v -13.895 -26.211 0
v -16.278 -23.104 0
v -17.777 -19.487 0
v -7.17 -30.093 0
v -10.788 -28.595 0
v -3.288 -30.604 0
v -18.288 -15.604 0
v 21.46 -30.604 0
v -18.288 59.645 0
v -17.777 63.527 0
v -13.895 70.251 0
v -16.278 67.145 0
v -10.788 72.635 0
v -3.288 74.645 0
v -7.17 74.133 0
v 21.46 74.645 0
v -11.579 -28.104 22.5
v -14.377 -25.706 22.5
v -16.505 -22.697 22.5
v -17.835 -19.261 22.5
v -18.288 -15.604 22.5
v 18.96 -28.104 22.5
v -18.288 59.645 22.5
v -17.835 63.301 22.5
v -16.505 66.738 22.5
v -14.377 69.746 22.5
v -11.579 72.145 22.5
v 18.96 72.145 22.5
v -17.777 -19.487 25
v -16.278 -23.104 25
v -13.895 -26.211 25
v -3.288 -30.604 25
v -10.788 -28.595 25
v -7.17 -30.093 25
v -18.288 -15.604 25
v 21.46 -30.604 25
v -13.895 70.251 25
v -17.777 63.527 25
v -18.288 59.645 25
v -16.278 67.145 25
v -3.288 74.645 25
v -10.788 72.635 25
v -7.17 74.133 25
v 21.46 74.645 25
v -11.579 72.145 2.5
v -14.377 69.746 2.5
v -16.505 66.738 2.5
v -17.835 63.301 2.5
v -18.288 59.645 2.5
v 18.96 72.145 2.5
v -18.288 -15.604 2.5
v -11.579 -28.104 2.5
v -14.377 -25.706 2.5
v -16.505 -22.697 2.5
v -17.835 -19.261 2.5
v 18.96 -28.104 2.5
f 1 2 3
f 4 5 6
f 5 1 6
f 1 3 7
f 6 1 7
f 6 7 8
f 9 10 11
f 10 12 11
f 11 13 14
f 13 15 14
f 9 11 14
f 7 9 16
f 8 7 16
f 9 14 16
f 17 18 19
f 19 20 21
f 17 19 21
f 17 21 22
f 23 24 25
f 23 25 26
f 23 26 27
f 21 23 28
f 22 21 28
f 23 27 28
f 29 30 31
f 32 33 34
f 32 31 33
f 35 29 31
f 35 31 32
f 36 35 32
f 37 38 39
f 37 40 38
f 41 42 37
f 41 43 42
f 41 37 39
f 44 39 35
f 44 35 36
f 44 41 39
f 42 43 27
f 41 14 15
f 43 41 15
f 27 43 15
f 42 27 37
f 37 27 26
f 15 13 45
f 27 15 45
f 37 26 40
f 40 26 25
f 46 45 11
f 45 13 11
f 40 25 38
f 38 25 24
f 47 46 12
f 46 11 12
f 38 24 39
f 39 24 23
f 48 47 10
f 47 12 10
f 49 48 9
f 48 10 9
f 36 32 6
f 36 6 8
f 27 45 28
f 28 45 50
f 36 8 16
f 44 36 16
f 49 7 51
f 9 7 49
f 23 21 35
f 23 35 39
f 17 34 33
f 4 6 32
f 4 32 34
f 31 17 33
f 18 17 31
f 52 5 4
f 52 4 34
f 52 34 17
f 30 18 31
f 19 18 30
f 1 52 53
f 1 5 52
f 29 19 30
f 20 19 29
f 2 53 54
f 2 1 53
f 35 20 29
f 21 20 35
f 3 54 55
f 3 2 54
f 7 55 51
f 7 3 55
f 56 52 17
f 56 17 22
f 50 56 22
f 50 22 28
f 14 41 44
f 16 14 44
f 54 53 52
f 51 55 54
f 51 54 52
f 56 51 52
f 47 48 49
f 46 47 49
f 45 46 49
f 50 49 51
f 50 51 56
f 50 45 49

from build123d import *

# Parameters (mm, degrees)
F0_W        = 39.7482234985
F0_H        = 105.248818174
F1_DEPTH    = 25
F2_T        = -2.5
F3_T1_DEPTH = 100


# Not quite as in the source:
# - a fillet or chamfer that OpenCascade refuses, or shapes differently, is made with other operations: its cross-section is extruded or revolved along the edge and cut away or added


with BuildPart() as f1:
    # F0 (on Top) → F1 (new body)
    with BuildSketch(Plane.XY):
        with Locations((1.5861960128, 22.0201415941)):
            Rectangle(F0_W, F0_H)
    extrude(amount=F1_DEPTH)

    # F2
    f2_openings = [f1.faces().sort_by_distance(p)[0] for p in [
        (-18.287916, 22.020142, 12.5),
    ]]
    offset(amount=F2_T, openings=f2_openings)

    # F3: fillet of radius 15 on 2 edges, made by hand

    # F3_s2 → F3_t1 (cut)
    with BuildSketch(Plane.XY.offset(-37.5)):
        with BuildLine():
            ThreePointArc((-3.2879157364, 74.6445506811), (-13.8945174542, 70.2511523989), (-18.2879157364, 59.6445506811))
            Line((-18.2879157364, 59.6445506811), (-18.2879157364, 74.6445506811))
            Line((-18.2879157364, 74.6445506811), (-3.2879157364, 74.6445506811))
        make_face()
        with BuildLine():
            ThreePointArc((-3.2879157364, -30.6042674929), (-13.8945174542, -26.2108692107), (-18.2879157364, -15.6042674929))
            Line((-18.2879157364, -15.6042674929), (-18.2879157364, -30.6042674929))
            Line((-18.2879157364, -30.6042674929), (-3.2879157364, -30.6042674929))
        make_face()
    extrude(amount=F3_T1_DEPTH, mode=Mode.SUBTRACT)


solid = f1.part
